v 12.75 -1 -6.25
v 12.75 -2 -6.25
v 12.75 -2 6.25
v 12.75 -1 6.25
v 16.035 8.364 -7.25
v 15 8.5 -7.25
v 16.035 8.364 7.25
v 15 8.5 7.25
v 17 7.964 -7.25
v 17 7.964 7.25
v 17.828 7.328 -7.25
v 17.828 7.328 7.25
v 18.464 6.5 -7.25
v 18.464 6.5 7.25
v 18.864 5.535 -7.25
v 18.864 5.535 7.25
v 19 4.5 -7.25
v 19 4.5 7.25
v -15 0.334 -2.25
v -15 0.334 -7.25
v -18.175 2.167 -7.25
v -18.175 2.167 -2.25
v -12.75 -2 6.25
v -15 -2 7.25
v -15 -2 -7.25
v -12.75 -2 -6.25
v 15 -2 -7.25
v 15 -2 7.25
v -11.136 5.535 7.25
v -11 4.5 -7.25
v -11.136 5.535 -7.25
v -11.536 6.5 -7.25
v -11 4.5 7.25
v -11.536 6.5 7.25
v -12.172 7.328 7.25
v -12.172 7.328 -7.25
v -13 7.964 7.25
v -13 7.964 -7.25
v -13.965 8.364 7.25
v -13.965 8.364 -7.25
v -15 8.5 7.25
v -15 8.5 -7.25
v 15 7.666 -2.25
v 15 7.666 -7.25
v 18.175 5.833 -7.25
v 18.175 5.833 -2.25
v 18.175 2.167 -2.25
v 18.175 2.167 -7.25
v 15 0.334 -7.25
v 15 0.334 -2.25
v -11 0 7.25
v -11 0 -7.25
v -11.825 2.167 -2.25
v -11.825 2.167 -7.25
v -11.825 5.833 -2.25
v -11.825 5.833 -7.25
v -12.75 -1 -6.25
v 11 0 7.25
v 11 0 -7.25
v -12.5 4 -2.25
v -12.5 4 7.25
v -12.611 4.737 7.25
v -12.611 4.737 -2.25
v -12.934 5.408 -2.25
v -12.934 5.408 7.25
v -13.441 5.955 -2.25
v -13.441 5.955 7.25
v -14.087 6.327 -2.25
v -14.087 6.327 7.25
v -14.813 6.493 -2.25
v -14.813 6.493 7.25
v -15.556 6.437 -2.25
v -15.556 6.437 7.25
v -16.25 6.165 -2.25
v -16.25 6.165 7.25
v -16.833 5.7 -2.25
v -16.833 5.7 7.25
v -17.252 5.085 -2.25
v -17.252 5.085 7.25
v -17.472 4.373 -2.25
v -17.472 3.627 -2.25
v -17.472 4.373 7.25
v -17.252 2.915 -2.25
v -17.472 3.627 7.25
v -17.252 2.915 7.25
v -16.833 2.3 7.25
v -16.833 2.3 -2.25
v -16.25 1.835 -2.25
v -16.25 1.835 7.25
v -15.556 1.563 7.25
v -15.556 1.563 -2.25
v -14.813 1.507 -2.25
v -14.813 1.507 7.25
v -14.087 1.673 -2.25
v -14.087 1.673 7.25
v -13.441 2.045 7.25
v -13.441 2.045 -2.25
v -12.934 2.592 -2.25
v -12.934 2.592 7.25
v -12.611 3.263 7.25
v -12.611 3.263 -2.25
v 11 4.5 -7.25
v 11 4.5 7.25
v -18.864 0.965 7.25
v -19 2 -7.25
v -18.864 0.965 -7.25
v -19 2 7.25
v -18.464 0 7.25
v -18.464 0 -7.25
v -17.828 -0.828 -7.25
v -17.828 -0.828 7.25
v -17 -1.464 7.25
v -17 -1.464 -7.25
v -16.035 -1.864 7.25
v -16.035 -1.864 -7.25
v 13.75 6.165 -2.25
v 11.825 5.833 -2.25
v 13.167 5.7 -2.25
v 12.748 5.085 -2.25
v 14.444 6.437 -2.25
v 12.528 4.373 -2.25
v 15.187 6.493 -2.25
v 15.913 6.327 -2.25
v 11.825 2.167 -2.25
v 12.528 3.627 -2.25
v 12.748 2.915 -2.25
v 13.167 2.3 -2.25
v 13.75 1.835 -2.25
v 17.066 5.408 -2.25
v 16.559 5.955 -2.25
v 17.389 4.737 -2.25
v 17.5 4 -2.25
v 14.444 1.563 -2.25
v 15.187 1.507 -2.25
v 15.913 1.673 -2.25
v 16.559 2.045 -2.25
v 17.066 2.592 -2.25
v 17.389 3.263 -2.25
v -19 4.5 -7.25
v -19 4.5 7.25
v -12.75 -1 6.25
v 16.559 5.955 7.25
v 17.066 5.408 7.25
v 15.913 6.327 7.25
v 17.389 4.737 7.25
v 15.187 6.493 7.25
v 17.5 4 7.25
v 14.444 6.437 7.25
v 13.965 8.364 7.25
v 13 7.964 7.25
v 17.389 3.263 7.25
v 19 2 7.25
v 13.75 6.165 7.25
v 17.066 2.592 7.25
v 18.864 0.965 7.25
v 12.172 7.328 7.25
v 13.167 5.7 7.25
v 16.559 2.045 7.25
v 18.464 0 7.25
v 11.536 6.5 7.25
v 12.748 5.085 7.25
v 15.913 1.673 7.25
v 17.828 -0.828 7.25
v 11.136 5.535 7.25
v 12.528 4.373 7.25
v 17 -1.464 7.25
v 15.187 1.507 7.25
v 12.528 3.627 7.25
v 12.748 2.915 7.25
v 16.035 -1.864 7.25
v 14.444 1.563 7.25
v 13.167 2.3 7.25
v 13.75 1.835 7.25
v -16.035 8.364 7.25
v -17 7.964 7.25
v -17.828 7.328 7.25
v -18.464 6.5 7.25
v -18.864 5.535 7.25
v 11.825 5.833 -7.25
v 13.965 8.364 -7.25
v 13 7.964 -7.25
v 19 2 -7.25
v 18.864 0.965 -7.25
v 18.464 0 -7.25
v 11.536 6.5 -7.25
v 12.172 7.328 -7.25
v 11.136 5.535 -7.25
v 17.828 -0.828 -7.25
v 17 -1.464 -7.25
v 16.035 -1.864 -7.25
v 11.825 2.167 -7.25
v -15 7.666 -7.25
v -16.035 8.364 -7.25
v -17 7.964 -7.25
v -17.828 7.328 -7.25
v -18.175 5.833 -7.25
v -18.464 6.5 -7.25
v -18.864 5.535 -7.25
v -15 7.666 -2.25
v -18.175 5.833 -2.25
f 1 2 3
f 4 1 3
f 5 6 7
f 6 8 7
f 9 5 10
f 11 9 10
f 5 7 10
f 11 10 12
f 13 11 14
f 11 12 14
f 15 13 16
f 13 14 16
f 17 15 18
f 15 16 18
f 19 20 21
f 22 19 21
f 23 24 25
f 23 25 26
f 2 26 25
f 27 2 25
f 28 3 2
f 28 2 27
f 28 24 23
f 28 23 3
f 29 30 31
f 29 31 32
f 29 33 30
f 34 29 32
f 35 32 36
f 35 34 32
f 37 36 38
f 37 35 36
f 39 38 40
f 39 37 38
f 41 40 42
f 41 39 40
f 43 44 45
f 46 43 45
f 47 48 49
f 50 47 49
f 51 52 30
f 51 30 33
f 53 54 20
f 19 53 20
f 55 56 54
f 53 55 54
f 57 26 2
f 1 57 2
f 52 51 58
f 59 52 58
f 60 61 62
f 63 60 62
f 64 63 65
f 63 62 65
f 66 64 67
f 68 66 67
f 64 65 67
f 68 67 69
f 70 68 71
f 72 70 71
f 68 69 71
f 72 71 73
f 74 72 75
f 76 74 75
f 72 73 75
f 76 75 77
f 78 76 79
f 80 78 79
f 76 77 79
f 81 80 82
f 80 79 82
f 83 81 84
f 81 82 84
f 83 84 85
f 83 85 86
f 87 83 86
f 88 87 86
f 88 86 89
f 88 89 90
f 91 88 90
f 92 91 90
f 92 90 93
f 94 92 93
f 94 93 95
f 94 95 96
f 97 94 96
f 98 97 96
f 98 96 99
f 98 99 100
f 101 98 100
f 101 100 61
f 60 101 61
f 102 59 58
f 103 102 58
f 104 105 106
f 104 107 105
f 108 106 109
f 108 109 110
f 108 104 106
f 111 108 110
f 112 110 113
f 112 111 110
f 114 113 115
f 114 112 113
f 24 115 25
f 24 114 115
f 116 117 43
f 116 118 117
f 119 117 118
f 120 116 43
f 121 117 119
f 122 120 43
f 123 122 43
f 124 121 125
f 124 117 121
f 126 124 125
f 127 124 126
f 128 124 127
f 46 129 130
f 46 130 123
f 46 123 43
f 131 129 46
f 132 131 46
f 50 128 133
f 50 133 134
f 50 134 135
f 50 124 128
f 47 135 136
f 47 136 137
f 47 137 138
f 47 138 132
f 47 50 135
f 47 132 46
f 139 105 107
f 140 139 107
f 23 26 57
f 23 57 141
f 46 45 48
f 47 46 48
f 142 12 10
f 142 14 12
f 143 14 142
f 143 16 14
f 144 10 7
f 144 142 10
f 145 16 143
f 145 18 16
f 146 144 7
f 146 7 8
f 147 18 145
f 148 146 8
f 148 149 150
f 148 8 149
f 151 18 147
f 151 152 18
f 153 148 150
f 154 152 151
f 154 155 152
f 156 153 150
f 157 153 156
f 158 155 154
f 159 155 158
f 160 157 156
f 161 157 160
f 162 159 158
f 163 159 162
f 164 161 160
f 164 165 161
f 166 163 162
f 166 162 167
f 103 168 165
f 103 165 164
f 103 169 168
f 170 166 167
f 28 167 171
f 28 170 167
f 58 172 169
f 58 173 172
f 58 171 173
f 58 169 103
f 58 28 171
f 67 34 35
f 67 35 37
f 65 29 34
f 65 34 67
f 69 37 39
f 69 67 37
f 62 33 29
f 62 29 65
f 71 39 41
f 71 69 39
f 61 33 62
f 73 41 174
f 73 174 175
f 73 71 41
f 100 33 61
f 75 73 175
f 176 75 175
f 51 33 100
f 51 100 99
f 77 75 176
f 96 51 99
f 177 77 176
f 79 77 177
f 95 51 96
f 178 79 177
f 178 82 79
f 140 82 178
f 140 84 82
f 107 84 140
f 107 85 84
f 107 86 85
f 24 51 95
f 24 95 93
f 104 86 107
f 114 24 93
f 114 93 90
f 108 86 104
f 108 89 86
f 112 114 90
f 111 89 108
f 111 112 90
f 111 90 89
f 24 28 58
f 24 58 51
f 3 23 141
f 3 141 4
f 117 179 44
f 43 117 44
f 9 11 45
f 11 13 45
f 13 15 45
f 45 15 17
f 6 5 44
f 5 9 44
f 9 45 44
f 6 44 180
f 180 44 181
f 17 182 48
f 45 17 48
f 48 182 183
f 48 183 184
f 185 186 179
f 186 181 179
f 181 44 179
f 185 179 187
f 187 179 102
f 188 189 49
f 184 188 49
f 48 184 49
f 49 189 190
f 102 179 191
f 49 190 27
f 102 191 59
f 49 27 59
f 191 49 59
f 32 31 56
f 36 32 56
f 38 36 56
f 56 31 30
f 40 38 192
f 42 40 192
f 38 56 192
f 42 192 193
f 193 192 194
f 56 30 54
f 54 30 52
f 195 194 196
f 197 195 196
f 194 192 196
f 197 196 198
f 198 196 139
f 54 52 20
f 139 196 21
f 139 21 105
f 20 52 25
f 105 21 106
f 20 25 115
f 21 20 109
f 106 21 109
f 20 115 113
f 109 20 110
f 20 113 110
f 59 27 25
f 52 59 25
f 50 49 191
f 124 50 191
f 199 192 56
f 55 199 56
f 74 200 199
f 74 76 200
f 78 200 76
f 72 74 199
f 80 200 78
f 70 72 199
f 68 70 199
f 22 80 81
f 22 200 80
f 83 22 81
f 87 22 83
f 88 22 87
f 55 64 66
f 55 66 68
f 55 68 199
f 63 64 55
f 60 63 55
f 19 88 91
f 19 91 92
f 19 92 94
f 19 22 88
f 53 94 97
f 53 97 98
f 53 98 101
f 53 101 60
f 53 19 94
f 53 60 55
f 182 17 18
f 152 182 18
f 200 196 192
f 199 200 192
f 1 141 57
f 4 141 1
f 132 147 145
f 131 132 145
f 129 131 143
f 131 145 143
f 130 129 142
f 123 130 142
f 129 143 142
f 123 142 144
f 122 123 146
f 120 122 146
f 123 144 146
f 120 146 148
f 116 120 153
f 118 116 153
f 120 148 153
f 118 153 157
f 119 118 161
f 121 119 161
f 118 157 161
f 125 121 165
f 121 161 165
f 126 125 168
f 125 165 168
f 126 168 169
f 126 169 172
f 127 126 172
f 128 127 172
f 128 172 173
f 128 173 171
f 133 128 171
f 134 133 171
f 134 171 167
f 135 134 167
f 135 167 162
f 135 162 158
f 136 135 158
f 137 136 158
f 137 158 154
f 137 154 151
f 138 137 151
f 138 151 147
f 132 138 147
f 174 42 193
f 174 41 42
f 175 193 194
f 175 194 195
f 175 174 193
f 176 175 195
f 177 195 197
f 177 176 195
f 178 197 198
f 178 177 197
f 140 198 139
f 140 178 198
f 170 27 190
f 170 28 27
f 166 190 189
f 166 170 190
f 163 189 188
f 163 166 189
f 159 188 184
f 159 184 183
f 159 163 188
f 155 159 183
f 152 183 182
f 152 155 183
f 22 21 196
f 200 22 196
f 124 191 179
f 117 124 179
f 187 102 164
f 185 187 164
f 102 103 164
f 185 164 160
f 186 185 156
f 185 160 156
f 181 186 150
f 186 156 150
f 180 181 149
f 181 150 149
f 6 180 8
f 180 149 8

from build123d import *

# Parameters (mm, degrees)
F0_W     = 38
F0_H     = 14.5
F1_DEPTH = 2
F2_W     = 25.5
F2_H     = 12.5
F3_DEPTH = 1
F4_W     = 8
F4_H     = 14.5
F5_DEPTH = 8.5
F6_R     = 2.5
F7_DEPTH = 25
F9_DEPTH = 5
F10_R    = 3.99999


# Not quite as in the source:
# - a fillet or chamfer is up to 0.001 mm smaller than in the source, because OpenCascade refuses the exact size


with BuildPart() as f1:
    # F0 (on Front) → F1 (new body)
    with BuildSketch(Plane.XZ):
        Rectangle(F0_W, F0_H)
    extrude(amount=F1_DEPTH)

    # F2 (on face) → F3 (cut)
    with BuildSketch(Plane.XZ.offset(2)):
        Rectangle(F2_W, F2_H)
    extrude(amount=-F3_DEPTH, mode=Mode.SUBTRACT)

    # F4 (on face) → F5 (join)
    with BuildSketch(Plane(origin=(0, 0, 0), x_dir=(-1, 0, 0), z_dir=(0, 1, 0))):
        with Locations((15, 0)):
            Rectangle(F4_W, F4_H)
        with Locations((-15, 0)):
            Rectangle(F4_W, F4_H)
    extrude(amount=F5_DEPTH)

    # F6 (on face) → F7 (cut)
    with BuildSketch(Plane.XY.offset(7.25)):
        with Locations((-15, 4)):
            Circle(F6_R)
        with Locations((15, 4)):
            Circle(F6_R)
    extrude(amount=-F7_DEPTH, mode=Mode.SUBTRACT)

    # F8 (on face) → F9 (cut)
    with BuildSketch(Plane(origin=(0, 0, -7.25), x_dir=(1, 0, 0), z_dir=(0, 0, -1))):
        Polygon((-15, -7.6661742094), (-11.825, -5.8330871047), (-11.825, -2.1669128953), (-15, -0.3338257906), (-18.175, -2.1669128953), (-18.175, -5.8330871047), align=None)
        Polygon((15, -7.6661742094), (18.175, -5.8330871047), (18.175, -2.1669128953), (15, -0.3338257906), (11.825, -2.1669128953), (11.825, -5.8330871047), align=None)
    extrude(amount=-F9_DEPTH, mode=Mode.SUBTRACT)

    # F10 (radius 4 in the source; OpenCascade refuses exactly that, so slightly less here)
    f10_edges = [f1.edges().sort_by_distance(p)[0] for p in [
        (-19, -2, 0),
        (-19, 8.5, 0),
        (11, 8.5, 0),
        (19, -2, 0),
        (-11, 8.5, 0),
        (19, 8.5, 0),
    ]]
    fillet(f10_edges, radius=F10_R)


solid = f1.part
